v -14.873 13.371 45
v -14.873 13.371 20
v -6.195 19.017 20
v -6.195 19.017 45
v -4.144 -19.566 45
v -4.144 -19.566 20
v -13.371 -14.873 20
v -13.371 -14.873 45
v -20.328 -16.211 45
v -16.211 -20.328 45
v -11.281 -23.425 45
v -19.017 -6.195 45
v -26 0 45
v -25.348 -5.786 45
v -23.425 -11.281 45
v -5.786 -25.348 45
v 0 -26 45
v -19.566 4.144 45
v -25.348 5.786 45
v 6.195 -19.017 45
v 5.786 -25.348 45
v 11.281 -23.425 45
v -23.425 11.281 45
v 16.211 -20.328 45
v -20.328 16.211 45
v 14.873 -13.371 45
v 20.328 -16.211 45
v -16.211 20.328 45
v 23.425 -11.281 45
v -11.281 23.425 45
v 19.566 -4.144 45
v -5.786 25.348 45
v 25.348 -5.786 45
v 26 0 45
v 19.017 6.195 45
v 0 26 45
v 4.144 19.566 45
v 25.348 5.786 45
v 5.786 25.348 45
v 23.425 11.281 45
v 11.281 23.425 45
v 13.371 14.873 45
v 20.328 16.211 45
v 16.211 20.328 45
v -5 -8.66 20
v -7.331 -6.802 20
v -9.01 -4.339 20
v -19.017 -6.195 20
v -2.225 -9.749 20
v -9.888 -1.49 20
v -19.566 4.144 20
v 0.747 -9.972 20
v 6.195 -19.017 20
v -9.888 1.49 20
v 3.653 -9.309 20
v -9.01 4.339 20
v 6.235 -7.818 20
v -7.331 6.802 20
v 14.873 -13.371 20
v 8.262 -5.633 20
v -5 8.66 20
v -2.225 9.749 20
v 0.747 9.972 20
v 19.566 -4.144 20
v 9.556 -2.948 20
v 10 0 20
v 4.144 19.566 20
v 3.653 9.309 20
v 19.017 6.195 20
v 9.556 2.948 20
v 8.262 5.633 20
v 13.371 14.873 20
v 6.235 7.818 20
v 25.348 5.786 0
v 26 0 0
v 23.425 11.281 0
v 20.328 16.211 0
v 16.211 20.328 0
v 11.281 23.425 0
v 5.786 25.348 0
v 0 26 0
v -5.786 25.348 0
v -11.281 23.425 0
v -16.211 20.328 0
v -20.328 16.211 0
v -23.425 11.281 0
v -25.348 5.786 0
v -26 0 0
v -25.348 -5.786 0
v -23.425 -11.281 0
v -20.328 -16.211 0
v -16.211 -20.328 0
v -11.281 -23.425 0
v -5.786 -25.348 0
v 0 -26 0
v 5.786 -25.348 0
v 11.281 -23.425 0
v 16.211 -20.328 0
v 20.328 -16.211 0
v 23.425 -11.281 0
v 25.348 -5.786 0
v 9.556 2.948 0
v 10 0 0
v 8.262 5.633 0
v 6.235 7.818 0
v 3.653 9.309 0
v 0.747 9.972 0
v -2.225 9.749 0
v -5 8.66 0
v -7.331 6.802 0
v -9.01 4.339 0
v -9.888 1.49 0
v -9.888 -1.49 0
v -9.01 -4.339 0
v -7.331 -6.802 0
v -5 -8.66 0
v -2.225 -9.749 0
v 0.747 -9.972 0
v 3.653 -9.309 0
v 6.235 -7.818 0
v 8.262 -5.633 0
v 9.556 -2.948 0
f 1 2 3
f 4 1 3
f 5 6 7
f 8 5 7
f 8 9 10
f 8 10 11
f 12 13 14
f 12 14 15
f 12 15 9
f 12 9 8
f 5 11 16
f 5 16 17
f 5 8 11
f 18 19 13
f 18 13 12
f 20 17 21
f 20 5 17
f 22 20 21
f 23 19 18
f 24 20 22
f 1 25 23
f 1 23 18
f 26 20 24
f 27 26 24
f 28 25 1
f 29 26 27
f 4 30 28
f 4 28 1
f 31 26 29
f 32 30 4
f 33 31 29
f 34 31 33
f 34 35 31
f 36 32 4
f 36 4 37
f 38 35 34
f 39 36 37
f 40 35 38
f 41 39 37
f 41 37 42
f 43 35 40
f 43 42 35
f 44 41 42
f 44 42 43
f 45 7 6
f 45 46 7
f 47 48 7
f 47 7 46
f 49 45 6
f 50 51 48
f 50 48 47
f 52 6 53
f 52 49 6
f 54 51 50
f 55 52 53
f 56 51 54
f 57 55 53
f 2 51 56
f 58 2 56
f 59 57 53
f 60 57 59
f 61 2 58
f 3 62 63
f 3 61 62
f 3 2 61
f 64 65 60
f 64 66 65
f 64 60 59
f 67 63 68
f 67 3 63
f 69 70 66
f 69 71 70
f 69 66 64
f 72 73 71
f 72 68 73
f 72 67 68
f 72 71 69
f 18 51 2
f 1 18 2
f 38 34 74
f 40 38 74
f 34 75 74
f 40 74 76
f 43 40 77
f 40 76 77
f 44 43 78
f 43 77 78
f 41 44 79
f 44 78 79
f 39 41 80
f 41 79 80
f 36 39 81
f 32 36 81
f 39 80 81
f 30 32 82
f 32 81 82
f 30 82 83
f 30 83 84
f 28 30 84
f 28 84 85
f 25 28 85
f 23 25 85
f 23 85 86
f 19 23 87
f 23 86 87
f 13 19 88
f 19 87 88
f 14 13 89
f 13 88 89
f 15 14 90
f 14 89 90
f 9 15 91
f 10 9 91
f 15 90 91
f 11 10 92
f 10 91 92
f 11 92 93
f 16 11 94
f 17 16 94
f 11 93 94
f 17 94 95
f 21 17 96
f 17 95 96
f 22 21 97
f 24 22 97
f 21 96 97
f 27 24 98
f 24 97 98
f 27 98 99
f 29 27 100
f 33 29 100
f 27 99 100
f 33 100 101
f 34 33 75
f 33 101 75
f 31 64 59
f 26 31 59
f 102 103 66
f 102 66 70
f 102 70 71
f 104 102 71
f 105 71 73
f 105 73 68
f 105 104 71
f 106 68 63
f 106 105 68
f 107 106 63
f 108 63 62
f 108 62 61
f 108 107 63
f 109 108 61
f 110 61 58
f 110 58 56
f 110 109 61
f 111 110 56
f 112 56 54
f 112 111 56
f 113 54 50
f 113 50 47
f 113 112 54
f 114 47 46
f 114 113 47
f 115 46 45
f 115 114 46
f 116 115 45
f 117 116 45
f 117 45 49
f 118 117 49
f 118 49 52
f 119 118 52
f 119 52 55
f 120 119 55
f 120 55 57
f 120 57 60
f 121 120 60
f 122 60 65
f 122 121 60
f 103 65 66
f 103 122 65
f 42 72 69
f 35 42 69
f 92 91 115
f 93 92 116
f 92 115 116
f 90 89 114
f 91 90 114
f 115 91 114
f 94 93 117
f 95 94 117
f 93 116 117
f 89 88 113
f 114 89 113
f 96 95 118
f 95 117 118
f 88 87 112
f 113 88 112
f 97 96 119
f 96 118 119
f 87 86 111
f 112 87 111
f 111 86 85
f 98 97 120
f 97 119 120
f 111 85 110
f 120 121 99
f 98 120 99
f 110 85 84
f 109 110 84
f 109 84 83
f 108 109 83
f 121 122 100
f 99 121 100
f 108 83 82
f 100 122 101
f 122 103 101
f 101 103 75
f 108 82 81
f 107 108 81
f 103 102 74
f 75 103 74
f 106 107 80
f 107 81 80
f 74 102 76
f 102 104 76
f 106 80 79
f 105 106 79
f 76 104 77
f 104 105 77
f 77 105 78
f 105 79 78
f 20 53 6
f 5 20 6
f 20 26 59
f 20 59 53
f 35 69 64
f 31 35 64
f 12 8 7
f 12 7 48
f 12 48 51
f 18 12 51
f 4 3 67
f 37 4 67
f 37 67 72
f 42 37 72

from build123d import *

# Parameters (mm, degrees)
F0_R     = 26
F0_R_2   = 10
F1_DEPTH = 20
F2_R     = 26
F3_DEPTH = 25


with BuildPart() as f1:
    # F0 (on Top) → F1 (new body)
    with BuildSketch(Plane.XY):
        Circle(F0_R)
        Circle(F0_R_2, mode=Mode.SUBTRACT)
    extrude(amount=F1_DEPTH)

    # F2 (on face) → F3 (join)
    with BuildSketch(Plane.XY.offset(20)):
        Circle(F2_R)
        with BuildLine():
            ThreePointArc((19.016501, 6.194569), (19.752595, 3.136078), (20, 0))
            ThreePointArc((20, 0), (19.891219, -2.083129), (19.566057, -4.143597))
            ThreePointArc((19.566057, -4.143597), (17.826918, -9.066476), (14.872904, -13.371489))
            ThreePointArc((14.872904, -13.371489), (10.905326, -16.765257), (6.194569, -19.016501))
            ThreePointArc((6.194569, -19.016501), (1.061661, -19.971802), (-4.143597, -19.566057))
            ThreePointArc((-4.143597, -19.566057), (-9.066476, -17.826918), (-13.371489, -14.872904))
            ThreePointArc((-13.371489, -14.872904), (-16.765257, -10.905326), (-19.016501, -6.194569))
            ThreePointArc((-19.016501, -6.194569), (-19.971802, -1.061661), (-19.566057, 4.143597))
            ThreePointArc((-19.566057, 4.143597), (-17.826918, 9.066476), (-14.872904, 13.371489))
            ThreePointArc((-14.872904, 13.371489), (-10.905326, 16.765257), (-6.194569, 19.016501))
            ThreePointArc((-6.194569, 19.016501), (-1.061661, 19.971802), (4.143597, 19.566057))
            ThreePointArc((4.143597, 19.566057), (9.066476, 17.826918), (13.371489, 14.872904))
            ThreePointArc((13.371489, 14.872904), (16.765257, 10.905326), (19.016501, 6.194569))
        make_face(mode=Mode.SUBTRACT)
        with BuildLine():
            Line((-14.872904, 13.371489), (-6.194569, 19.016501))
            ThreePointArc((-6.194569, 19.016501), (-10.905326, 16.765257), (-14.872904, 13.371489))
        make_face()
        with BuildLine():
            Line((-6.194569, 19.016501), (4.143597, 19.566057))
            ThreePointArc((4.143597, 19.566057), (-1.061661, 19.971802), (-6.194569, 19.016501))
        make_face()
        with BuildLine():
            Line((4.143597, 19.566057), (13.371489, 14.872904))
            ThreePointArc((13.371489, 14.872904), (9.066476, 17.826918), (4.143597, 19.566057))
        make_face()
        with BuildLine():
            Line((13.371489, 14.872904), (19.016501, 6.194569))
            ThreePointArc((19.016501, 6.194569), (16.765257, 10.905326), (13.371489, 14.872904))
        make_face()
        with BuildLine():
            Line((-19.566057, 4.143597), (-14.872904, 13.371489))
            ThreePointArc((-14.872904, 13.371489), (-17.826918, 9.066476), (-19.566057, 4.143597))
        make_face()
        with BuildLine():
            ThreePointArc((-13.371489, -14.872904), (-9.066476, -17.826918), (-4.143597, -19.566057))
            Line((-4.143597, -19.566057), (-13.371489, -14.872904))
        make_face()
        with BuildLine():
            ThreePointArc((-19.016501, -6.194569), (-16.765257, -10.905326), (-13.371489, -14.872904))
            Line((-13.371489, -14.872904), (-19.016501, -6.194569))
        make_face()
        with BuildLine():
            ThreePointArc((-4.143597, -19.566057), (1.061661, -19.971802), (6.194569, -19.016501))
            Line((6.194569, -19.016501), (-4.143597, -19.566057))
        make_face()
        with BuildLine():
            ThreePointArc((6.194569, -19.016501), (10.905326, -16.765257), (14.872904, -13.371489))
            Line((14.872904, -13.371489), (6.194569, -19.016501))
        make_face()
        with BuildLine():
            ThreePointArc((14.872904, -13.371489), (17.826918, -9.066476), (19.566057, -4.143597))
            Line((19.566057, -4.143597), (14.872904, -13.371489))
        make_face()
        with BuildLine():
            ThreePointArc((19.566057, -4.143597), (19.891219, -2.083129), (20, 0))
            ThreePointArc((20, 0), (19.752595, 3.136078), (19.016501, 6.194569))
            Line((19.016501, 6.194569), (19.566057, -4.143597))
        make_face()
        with BuildLine():
            Line((-19.016501, -6.194569), (-19.566057, 4.143597))
            ThreePointArc((-19.566057, 4.143597), (-19.971802, -1.061661), (-19.016501, -6.194569))
        make_face()
    extrude(amount=F3_DEPTH)


solid = f1.part
